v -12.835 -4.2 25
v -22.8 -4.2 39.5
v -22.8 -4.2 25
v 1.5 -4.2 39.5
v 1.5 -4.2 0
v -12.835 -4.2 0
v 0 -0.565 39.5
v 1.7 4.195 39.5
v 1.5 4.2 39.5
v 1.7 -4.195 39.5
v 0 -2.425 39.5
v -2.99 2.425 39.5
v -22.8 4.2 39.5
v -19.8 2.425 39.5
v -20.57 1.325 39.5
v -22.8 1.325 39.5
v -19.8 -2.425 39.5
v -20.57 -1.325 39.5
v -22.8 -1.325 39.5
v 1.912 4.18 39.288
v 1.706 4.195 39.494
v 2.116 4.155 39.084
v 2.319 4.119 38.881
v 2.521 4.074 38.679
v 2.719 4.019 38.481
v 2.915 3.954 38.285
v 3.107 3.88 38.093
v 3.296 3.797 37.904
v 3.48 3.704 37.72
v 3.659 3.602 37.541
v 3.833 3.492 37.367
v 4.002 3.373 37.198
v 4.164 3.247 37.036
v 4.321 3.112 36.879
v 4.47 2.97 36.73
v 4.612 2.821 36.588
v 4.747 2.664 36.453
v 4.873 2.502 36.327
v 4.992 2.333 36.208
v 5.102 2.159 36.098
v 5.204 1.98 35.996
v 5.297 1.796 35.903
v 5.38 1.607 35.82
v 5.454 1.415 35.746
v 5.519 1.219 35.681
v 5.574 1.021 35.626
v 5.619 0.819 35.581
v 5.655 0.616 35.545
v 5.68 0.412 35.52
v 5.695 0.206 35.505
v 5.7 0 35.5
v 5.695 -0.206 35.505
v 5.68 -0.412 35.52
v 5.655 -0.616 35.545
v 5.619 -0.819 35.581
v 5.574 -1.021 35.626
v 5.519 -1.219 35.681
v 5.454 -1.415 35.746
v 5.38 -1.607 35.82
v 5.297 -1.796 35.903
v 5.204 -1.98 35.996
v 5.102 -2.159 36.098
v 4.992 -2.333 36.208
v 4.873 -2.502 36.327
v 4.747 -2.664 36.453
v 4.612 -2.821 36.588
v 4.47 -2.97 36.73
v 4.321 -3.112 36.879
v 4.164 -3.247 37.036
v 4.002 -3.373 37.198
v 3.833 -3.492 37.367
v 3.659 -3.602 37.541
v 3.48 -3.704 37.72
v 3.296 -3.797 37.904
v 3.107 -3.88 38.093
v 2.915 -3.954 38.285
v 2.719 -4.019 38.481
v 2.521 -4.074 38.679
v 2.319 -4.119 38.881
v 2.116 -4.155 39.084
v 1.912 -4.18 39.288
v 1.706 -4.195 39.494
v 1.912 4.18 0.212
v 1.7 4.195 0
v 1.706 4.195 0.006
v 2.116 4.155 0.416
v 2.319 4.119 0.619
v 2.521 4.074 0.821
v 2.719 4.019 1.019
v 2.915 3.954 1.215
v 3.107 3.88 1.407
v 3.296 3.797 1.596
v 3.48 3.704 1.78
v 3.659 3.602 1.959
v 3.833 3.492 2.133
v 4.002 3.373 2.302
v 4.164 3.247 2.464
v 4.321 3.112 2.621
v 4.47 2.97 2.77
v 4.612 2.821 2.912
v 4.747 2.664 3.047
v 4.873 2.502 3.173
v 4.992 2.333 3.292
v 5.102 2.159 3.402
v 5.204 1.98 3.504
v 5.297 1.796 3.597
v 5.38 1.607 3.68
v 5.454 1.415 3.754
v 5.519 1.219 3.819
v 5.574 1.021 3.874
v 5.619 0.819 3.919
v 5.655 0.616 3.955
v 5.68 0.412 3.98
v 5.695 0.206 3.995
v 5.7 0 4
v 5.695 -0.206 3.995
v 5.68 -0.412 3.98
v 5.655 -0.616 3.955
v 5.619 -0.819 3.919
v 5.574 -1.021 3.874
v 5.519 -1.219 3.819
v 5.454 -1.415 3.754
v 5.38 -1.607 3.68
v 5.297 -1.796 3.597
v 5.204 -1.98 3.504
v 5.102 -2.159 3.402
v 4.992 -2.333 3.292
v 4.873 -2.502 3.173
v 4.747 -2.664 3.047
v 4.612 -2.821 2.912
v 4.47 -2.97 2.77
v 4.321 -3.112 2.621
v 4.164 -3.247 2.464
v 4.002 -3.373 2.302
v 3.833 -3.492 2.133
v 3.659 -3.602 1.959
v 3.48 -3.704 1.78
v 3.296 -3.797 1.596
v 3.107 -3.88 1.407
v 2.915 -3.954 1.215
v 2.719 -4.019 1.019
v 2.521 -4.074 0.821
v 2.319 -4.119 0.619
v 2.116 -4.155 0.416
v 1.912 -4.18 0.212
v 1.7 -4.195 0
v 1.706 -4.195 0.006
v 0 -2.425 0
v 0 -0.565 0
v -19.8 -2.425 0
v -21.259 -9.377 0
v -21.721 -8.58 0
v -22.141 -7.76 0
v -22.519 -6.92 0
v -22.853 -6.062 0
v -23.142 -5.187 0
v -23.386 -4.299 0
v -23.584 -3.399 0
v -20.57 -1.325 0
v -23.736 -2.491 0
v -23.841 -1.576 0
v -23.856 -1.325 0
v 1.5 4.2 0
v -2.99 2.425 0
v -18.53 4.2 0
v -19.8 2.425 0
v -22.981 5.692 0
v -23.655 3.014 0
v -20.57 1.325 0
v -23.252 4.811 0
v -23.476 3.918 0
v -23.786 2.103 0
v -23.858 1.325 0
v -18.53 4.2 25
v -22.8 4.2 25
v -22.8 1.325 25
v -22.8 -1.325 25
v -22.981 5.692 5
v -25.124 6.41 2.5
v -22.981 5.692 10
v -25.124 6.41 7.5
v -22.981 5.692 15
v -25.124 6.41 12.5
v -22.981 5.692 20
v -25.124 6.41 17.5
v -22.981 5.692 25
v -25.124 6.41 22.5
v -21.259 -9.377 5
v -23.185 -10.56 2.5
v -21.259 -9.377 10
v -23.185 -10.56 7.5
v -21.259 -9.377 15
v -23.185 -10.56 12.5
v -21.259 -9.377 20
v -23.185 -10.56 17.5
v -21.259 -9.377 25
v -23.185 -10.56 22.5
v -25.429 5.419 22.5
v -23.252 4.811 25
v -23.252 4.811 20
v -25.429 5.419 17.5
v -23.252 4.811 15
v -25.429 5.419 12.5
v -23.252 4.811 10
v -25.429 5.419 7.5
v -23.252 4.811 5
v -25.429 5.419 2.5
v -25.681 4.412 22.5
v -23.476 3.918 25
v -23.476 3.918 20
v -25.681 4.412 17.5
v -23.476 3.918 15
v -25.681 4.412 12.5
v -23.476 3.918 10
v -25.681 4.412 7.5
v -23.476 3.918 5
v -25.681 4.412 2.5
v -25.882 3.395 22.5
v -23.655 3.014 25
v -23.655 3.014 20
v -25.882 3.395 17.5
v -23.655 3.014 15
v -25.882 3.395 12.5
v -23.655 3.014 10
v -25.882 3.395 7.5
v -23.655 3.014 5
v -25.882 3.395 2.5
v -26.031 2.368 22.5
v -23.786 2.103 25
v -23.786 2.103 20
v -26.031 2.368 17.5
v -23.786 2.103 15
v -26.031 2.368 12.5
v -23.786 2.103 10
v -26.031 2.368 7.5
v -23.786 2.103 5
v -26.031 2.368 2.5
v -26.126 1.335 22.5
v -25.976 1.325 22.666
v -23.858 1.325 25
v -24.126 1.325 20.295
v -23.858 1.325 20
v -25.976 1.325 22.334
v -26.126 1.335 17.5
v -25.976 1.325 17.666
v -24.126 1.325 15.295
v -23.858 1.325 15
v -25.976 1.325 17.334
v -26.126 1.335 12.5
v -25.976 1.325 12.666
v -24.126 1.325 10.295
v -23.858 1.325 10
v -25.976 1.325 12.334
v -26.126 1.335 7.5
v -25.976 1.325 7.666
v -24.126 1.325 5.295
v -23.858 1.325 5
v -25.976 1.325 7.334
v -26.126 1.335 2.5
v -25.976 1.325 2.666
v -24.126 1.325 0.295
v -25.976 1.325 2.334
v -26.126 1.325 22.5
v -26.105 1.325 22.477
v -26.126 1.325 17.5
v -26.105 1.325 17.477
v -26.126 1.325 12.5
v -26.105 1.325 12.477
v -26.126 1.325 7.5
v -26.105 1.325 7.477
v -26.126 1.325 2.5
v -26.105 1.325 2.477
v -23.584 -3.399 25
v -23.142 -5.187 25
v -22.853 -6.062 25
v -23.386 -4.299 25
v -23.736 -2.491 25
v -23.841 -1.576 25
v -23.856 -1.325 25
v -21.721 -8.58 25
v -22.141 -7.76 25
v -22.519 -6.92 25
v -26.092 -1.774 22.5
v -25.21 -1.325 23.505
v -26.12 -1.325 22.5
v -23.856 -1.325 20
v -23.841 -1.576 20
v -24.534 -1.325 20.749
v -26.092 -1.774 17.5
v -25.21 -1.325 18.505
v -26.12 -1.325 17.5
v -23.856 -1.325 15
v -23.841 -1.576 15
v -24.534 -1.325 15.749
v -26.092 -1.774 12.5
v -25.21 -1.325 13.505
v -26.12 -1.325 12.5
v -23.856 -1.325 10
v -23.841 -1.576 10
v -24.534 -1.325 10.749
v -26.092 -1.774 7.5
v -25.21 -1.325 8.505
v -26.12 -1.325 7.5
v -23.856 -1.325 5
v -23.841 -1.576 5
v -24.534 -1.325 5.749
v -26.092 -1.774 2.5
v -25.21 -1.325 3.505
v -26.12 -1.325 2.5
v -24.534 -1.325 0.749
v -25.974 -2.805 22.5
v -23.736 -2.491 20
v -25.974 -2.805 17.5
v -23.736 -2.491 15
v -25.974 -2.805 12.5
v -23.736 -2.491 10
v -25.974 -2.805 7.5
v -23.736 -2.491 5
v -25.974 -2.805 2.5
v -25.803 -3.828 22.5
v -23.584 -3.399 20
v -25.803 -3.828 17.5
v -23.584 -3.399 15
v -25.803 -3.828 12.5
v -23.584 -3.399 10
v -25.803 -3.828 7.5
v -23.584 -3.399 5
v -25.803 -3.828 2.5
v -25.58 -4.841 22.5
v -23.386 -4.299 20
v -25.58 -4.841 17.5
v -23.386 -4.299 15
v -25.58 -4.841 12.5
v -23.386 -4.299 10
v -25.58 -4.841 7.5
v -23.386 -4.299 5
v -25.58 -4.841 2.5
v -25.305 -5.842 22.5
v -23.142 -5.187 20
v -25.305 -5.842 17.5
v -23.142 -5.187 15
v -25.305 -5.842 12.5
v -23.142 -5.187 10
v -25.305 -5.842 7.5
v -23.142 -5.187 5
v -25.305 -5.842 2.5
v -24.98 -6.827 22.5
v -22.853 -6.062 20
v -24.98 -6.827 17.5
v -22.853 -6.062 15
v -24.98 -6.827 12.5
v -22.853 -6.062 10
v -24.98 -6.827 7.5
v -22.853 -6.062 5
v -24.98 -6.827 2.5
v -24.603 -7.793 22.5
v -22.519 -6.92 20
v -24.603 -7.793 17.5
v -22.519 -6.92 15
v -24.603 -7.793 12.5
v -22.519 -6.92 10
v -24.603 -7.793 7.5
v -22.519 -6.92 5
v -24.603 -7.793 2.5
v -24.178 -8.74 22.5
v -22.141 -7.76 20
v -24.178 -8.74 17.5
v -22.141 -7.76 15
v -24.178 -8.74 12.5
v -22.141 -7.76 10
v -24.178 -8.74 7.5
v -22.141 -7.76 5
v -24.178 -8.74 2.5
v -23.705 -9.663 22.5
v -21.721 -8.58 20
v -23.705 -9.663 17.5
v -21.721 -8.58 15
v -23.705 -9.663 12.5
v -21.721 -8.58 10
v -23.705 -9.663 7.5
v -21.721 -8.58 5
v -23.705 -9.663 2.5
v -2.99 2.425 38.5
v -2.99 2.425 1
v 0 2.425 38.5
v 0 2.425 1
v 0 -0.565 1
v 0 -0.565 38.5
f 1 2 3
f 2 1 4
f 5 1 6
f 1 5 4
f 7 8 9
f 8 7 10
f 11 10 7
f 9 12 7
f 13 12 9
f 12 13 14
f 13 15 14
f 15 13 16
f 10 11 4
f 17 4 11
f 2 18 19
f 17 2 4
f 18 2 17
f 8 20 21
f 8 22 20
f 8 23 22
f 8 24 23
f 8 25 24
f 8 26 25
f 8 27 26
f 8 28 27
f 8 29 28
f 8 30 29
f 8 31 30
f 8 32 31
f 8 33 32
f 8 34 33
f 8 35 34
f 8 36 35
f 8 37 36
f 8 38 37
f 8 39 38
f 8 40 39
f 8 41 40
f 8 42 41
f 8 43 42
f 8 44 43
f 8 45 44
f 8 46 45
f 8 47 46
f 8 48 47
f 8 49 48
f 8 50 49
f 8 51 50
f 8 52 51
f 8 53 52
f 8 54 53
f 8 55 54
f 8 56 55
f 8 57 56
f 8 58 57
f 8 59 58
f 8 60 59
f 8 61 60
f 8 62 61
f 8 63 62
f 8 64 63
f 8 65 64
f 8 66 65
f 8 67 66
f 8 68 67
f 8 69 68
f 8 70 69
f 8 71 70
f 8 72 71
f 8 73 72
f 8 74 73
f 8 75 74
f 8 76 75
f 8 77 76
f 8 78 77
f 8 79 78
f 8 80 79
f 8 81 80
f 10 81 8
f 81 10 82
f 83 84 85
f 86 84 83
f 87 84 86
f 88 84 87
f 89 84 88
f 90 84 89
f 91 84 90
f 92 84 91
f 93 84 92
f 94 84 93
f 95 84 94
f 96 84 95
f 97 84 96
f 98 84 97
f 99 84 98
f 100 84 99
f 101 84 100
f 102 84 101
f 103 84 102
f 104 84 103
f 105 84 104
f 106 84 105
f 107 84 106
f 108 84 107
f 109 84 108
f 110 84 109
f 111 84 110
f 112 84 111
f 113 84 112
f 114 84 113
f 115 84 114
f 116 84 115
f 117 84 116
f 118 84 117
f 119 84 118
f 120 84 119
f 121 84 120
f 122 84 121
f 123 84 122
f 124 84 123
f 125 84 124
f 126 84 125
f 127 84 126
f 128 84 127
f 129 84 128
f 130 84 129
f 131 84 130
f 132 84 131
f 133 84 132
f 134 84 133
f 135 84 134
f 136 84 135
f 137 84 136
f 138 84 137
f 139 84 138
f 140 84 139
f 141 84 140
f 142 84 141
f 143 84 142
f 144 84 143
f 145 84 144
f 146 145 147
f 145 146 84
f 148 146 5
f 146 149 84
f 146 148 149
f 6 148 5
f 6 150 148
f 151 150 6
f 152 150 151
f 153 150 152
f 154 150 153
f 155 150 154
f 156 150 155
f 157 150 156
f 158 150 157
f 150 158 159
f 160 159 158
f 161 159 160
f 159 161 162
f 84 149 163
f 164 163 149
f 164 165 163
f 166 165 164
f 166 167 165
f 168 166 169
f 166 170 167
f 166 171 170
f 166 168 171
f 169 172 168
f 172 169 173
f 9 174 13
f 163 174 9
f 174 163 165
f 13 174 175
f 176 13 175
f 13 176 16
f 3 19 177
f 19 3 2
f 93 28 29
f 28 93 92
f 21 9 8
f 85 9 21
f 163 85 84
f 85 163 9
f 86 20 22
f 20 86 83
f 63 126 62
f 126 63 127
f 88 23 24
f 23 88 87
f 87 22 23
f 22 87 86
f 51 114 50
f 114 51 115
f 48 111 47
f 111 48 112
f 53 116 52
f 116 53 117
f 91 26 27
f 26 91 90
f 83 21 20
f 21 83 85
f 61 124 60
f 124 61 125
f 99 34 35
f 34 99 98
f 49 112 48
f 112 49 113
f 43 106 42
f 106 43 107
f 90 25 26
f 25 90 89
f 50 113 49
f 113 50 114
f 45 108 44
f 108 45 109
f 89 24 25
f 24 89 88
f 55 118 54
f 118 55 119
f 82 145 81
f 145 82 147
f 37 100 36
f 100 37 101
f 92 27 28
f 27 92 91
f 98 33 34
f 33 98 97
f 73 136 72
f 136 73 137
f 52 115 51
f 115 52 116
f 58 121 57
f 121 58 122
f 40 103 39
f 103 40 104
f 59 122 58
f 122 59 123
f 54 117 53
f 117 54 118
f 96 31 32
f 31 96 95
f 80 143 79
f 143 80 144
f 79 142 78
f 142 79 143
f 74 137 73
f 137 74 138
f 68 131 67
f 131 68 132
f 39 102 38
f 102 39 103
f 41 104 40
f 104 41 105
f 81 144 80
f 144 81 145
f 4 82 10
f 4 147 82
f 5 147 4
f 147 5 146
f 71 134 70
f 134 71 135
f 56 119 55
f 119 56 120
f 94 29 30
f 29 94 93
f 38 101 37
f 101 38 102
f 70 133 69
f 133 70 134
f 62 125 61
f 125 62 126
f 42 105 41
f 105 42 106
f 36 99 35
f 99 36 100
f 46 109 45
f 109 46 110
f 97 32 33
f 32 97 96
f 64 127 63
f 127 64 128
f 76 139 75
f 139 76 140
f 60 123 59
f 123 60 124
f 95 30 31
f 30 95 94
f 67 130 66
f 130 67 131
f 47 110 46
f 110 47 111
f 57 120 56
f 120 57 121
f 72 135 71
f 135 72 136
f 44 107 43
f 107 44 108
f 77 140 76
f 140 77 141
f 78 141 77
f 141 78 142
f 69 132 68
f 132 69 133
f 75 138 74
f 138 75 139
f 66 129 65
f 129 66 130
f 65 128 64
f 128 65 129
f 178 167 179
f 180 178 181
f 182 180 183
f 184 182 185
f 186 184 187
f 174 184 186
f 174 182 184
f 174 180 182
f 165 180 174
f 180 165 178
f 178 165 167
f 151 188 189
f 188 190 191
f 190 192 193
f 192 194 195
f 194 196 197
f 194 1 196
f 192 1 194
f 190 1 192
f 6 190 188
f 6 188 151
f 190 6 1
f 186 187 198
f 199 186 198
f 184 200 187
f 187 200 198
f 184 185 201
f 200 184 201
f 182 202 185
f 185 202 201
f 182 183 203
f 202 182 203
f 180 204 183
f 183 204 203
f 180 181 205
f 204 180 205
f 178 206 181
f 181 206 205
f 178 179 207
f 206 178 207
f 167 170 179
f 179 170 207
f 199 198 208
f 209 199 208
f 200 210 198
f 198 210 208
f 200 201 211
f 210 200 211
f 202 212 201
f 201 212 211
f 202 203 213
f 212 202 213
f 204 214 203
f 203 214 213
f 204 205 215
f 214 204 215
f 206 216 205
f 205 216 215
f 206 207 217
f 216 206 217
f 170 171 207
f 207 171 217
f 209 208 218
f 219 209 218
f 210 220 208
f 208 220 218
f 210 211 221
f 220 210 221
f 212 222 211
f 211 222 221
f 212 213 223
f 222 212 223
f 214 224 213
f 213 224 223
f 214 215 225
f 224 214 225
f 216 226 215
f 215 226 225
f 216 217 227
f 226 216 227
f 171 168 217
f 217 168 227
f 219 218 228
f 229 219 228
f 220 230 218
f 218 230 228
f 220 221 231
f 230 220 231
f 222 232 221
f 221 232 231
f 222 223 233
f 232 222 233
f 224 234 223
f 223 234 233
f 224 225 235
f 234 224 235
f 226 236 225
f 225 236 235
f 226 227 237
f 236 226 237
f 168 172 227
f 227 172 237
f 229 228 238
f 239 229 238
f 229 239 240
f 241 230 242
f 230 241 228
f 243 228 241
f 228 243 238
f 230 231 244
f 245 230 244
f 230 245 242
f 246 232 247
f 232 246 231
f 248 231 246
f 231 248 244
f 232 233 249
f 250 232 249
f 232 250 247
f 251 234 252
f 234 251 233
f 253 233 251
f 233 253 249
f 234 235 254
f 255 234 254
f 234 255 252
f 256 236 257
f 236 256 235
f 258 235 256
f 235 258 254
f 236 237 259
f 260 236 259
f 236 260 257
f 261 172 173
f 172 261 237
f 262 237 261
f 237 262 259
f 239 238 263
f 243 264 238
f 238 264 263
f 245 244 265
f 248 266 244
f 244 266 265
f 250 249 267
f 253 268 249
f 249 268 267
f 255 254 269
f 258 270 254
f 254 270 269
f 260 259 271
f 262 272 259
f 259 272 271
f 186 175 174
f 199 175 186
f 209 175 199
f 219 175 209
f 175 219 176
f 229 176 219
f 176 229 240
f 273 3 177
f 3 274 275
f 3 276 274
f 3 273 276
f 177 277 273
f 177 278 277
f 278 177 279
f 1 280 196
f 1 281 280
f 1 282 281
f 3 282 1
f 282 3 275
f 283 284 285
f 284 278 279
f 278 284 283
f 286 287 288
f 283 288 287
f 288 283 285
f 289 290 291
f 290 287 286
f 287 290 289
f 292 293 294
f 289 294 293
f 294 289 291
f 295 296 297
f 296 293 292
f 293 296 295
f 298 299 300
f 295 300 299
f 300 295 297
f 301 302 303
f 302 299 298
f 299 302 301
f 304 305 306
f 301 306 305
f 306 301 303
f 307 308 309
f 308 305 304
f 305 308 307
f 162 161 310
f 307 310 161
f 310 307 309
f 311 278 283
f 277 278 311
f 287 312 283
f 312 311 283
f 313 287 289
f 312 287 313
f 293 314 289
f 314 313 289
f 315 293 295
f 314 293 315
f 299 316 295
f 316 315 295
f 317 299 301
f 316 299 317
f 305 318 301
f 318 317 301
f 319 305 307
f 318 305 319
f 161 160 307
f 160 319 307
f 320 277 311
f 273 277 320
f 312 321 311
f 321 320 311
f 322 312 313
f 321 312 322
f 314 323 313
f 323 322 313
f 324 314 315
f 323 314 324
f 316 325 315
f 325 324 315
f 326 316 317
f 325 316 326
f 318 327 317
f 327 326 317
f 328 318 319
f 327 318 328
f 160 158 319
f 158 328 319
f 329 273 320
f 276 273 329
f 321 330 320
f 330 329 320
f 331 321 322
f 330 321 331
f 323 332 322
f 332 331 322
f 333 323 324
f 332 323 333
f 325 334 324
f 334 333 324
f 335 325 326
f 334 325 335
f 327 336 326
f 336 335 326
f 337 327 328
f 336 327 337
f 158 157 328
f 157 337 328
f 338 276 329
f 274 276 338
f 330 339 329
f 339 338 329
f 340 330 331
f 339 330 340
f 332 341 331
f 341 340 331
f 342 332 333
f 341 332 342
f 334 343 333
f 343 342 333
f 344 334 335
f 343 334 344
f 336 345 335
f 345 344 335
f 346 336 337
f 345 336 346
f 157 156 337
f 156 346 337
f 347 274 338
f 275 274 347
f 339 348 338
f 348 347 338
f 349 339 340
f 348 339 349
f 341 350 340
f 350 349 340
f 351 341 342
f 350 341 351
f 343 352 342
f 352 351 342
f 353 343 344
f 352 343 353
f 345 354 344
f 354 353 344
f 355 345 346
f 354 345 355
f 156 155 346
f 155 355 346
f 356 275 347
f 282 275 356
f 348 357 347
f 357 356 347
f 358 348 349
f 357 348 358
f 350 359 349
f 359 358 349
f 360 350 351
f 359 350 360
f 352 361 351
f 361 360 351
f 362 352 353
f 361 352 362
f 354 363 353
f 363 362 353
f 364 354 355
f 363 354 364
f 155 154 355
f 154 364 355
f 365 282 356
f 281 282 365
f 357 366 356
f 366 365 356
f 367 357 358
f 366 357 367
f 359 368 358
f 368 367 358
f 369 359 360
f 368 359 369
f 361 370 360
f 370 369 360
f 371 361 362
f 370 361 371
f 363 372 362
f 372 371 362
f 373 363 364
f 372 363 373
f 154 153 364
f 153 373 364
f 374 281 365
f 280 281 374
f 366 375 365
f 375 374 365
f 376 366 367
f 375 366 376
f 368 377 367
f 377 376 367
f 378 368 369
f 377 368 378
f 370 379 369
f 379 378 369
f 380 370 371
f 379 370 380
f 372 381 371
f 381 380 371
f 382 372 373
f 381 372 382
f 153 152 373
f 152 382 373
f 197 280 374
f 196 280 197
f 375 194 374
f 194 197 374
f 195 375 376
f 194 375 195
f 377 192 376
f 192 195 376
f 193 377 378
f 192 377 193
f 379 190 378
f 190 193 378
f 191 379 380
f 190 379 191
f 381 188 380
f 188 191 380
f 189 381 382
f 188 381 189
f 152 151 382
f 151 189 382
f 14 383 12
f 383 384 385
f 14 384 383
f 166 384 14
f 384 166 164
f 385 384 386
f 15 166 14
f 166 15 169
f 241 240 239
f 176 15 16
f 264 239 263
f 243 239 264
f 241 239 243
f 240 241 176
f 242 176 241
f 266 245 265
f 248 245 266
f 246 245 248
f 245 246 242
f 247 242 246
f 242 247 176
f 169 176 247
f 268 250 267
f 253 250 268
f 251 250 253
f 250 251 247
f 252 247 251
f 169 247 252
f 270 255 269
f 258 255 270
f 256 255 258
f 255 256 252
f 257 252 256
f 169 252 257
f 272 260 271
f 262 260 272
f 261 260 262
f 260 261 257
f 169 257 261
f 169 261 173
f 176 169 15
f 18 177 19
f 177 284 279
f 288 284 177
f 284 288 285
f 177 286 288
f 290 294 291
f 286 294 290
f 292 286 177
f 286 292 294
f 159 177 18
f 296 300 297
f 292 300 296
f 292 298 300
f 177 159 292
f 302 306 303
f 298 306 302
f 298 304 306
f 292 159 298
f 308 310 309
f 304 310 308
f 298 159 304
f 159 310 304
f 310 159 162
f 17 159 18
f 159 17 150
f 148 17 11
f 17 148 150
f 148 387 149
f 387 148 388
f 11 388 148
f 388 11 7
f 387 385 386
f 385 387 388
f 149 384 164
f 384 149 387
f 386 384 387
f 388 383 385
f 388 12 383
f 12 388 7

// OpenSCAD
//<params>
left = true;
// oem is 35.5
tabWidth = 39.5;
tabThickness = 8.4;
vaneThickness = 4.45;
vaneTolerance = 0.2;
extraBehindVane = 3;
extraInFrontOfVane = 1.5;
vaneSnapSize = 1.1;
vaneDepth = 19.4;
maxFrontOfVaneToGear = 26.16;
minFrontOfVaneToGear = 23.9;
axleFromFrontOfVane = 6;
gearTolerance = 0.2;
// 0=left, 0.5=center, 1=right (assuming left=true; otherwise, mirrored)
toothPositioning = 0;
toothSpacing = 5;
numberOfTeeth = 5; 
topToothHeight = 6;
bottomToothHeight = 11;
blockerLength = 1;
blockerChamfer = 3;
outerChamfer = 4;
//</params>

module sideTab(
 left=left,
 tabWidth=tabWidth,
 tabThickness=tabThickness,
 vaneThickness=vaneThickness,
 vaneTolerance=vaneTolerance,
 extraBehindVane=extraBehindVane,
 extraInFrontOfVane=extraInFrontOfVane,
 vaneSnapSize=vaneSnapSize,
 vaneDepth=vaneDepth,
 maxFrontOfVaneToGear=maxFrontOfVaneToGear,
 minFrontOfVaneToGear=minFrontOfVaneToGear,
 axleFromFrontOfVane=axleFromFrontOfVane,
 gearTolerance=gearTolerance,
 toothPositioning=toothPositioning,
 toothSpacing=toothSpacing,
 numberOfTeeth=numberOfTeeth,
 topToothHeight=topToothHeight,
 bottomToothHeight=bottomToothHeight,
 blockerLength=blockerLength,
 blockerChamfer=blockerChamfer,
 outerChamfer=outerChamfer,
 )
{
  
  module dummy() {}
  
  nudge = 0.01;
  vaneThickness1 = vaneThickness + 2 * vaneTolerance;
  vaneDepth1 = vaneDepth + 2 * vaneTolerance;
  $fn = 128;
  toothEndAngle = atan2(bottomToothHeight,(minFrontOfVaneToGear-axleFromFrontOfVane));
  toothStartAngle = -atan2(topToothHeight,(minFrontOfVaneToGear-axleFromFrontOfVane));
  
  // 0,0 = front of vane, centered
  
  module outerChamfer() {
      d = outerChamfer;
      x = tabThickness/2+extraInFrontOfVane;
      rotate([90,0,0])
      linear_extrude(center=true,height=tabThickness) polygon([[-100,0],[x-d,0],[x,d],[x,tabWidth-d],[x-d,tabWidth],[-100,tabWidth]]);
  }
  
  module outerProfile() {
      intersection() {
          outerChamfer();
          linear_extrude(height=tabWidth)
              translate([-vaneDepth1,0])
              hull() {
                  translate([-extraBehindVane,-tabThickness/2]) square([1,tabThickness]);
                  translate([vaneDepth1+extraInFrontOfVane,0]) circle(d=tabThickness);
              }
      }
  }
  
  function doubleProfile(polyHalf) = 
      let(n=len(polyHalf))
      concat(polyHalf, [for (i=[0:n-1]) 
          [polyHalf[n-1-i][0],-polyHalf[n-1-i][1]]]);
      
  module toothProfile() {
      short = minFrontOfVaneToGear;
      long = maxFrontOfVaneToGear;
      teethSize = toothSpacing*numberOfTeeth;
      spine = [ [ axleFromFrontOfVane, teethSize ], [ axleFromFrontOfVane, 0 ] ];
      n = 2*numberOfTeeth+1;
      teeth = [ for(i=[0:n-1]) 
           [ i % 2 == 0 ? short : long, teethSize*i/(n-1) ]  ];
      translate([0,toothPositioning*(tabWidth-teethSize)])
      polygon(concat(teeth,spine)); 
  }
  
  module innerProfile() {
      bottom = [
          [ -100,-vaneThickness1/2+vaneSnapSize ], 
          [ -vaneSnapSize*.7, -vaneThickness1/2+vaneSnapSize ],
          [ 0, -vaneThickness1/2 ],
          [ vaneDepth1, -vaneThickness1/2 ],
      ];
      translate([-vaneDepth1,0]) polygon(doubleProfile(bottom));
  }
  
  module blocker() {
      linear_extrude(height=blockerLength) 
      polygon( [[  nudge, vaneThickness1/2-blockerChamfer ],
               [  nudge, vaneThickness1/2+nudge ],
               [ -blockerChamfer, vaneThickness1/2+nudge ]] );
  }
  
  module main() {
      difference() {
          union() {
              outerProfile();
              translate([-axleFromFrontOfVane,0]) 
              rotate([0,0,180+toothStartAngle])
              rotate_extrude(angle=toothEndAngle-toothStartAngle)  translate([nudge-axleFromFrontOfVane,0]) toothProfile();
          }
          translate([0,0,-nudge]) linear_extrude(height=tabWidth+2*nudge) innerProfile();
      }
      blocker();
      translate([0,0,tabWidth-blockerLength]) blocker();
  }
  
  
  if (left) 
      main();
  else
      mirror([1,0,0]) main();
}

sideTab();
